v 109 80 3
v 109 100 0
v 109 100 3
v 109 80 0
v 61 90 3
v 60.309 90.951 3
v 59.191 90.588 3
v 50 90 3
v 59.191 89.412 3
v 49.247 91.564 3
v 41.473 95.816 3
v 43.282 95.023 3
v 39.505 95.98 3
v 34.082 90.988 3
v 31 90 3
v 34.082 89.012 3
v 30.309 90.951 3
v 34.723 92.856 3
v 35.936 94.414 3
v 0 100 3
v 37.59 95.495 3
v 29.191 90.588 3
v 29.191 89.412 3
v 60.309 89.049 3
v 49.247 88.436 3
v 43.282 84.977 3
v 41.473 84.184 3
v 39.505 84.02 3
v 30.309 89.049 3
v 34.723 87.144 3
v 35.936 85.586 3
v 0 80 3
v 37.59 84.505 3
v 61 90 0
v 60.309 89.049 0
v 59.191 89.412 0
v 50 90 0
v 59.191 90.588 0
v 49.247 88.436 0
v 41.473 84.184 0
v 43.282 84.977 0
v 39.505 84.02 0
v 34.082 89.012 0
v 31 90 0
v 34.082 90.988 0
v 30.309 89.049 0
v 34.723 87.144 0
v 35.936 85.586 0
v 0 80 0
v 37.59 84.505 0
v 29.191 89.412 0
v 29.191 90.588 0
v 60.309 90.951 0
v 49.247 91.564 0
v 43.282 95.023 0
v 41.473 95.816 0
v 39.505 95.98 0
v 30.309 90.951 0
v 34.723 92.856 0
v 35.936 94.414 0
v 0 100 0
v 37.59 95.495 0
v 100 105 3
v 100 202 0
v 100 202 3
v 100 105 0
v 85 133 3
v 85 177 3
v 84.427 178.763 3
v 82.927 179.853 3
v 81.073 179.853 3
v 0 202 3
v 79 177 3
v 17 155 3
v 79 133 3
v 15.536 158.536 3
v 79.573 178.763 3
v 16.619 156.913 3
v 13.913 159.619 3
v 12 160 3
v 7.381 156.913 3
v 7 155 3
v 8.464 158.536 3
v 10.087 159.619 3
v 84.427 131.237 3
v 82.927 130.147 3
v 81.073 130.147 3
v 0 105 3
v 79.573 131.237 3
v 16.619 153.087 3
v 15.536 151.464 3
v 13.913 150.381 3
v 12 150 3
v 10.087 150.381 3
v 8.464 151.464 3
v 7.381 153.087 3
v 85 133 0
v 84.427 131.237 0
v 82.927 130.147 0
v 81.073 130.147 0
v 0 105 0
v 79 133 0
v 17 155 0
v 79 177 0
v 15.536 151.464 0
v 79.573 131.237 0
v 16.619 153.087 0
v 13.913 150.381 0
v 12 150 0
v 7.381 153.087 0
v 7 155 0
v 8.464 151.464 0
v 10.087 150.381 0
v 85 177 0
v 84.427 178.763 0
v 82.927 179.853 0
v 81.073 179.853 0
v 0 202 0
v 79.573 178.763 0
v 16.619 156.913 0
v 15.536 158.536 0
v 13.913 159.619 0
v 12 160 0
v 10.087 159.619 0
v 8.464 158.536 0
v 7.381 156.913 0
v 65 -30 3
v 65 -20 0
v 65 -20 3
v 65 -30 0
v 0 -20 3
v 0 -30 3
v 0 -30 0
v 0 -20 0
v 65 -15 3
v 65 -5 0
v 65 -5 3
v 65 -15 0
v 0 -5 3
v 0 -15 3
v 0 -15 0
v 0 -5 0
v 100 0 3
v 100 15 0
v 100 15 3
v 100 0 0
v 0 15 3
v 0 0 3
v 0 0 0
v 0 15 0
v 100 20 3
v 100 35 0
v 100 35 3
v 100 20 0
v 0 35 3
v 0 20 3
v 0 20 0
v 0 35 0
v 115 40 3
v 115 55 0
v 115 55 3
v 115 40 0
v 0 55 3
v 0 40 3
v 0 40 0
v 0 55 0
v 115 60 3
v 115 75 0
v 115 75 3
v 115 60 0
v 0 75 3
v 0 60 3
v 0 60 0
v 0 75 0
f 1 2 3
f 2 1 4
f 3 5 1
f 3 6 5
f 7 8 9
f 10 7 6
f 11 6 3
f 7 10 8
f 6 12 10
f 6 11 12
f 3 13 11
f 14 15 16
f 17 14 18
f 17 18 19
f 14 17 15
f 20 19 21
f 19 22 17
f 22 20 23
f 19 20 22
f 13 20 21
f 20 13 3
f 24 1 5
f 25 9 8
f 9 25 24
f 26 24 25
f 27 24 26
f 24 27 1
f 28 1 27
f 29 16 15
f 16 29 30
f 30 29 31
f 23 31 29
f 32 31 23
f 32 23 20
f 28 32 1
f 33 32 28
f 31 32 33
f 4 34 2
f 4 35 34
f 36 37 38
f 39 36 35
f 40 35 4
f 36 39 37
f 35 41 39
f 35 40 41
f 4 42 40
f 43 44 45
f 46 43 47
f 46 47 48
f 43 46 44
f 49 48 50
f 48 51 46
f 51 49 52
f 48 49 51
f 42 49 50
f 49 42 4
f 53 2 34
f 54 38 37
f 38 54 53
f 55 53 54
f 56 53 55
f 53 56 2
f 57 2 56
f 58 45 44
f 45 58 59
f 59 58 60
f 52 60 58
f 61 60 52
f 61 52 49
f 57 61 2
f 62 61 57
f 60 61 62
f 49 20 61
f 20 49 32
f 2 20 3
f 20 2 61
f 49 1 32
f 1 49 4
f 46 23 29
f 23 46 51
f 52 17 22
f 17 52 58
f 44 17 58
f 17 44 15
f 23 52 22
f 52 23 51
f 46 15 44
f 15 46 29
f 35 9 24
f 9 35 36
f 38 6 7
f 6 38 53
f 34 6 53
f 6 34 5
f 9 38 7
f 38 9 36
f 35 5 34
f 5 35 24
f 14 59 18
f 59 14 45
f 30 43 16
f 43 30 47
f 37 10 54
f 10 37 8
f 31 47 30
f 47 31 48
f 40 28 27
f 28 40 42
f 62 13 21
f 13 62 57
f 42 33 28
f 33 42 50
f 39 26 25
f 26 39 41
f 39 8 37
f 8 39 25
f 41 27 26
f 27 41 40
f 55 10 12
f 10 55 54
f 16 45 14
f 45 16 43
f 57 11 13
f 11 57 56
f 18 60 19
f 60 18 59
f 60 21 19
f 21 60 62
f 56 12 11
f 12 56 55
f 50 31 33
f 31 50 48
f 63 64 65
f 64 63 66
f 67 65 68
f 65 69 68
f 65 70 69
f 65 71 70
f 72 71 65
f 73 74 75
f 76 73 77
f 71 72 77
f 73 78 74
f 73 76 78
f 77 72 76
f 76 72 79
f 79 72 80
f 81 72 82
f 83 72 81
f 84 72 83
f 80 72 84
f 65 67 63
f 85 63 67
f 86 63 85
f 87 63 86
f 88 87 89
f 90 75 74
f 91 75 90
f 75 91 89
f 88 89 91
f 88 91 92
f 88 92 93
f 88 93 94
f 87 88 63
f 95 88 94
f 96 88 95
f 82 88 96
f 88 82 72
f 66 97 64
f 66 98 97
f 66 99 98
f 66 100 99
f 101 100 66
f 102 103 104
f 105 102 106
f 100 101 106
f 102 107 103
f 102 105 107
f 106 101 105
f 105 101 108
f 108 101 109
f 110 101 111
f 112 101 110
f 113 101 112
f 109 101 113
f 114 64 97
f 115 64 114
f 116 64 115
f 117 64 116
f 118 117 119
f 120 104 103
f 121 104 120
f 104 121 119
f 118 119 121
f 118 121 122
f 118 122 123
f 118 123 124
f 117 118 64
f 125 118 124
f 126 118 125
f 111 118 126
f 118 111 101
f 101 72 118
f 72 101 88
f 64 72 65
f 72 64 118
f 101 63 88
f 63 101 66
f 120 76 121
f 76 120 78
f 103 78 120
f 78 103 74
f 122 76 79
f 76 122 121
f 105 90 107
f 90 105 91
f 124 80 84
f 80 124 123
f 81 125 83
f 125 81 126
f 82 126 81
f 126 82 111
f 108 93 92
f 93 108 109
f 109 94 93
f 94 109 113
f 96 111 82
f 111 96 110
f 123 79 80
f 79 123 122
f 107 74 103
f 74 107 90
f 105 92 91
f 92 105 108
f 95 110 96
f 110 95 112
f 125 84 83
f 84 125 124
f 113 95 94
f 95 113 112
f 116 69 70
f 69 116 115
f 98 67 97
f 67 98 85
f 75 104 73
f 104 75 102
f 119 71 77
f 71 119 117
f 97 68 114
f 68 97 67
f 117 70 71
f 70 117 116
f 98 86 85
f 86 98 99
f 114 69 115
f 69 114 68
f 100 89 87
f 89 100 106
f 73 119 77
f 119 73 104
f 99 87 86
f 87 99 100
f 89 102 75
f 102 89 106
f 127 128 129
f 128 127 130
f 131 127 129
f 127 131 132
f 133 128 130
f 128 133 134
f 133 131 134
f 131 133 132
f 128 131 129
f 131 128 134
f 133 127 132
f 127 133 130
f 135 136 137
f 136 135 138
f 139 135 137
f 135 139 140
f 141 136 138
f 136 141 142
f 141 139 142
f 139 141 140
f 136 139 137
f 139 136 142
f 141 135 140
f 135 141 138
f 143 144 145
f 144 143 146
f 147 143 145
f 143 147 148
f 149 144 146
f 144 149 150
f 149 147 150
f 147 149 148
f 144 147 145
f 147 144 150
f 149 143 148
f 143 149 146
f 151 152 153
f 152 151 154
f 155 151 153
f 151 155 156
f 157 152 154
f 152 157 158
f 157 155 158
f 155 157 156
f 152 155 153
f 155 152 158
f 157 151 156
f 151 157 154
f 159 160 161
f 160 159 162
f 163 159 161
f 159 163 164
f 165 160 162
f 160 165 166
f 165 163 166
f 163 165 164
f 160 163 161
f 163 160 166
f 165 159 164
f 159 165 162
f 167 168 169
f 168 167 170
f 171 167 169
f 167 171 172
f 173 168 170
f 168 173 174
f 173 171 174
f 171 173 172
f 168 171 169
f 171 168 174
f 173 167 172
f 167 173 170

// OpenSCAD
//Wood parts

//Servo model
//http://www.thingiverse.com/thing:697243

translate([0,-30,0])
	cube([65,10,3]);

translate([0,-15,0])
	cube([65,10,3]);

cube([100,15,3]);

translate([0,20,0])
	cube([100,15,3]);
	
translate([0,40,0])
	cube([115,15,3]);	
	
translate([0,60,0])
	cube([115,15,3]);
	
//Servo plank
translate([0,80,0])
	difference(){
	cube([109,20,3]);
	translate([30,10,-2])		
		cylinder(d=2,h=8,centre=true);
	translate([60,10,-2])		
		cylinder(d=2,h=8,centre=true);
	translate([40,10,-2])
		hull() {
			cylinder(d=12,h=8,centre=true);
			translate([8,0,0])	
			cylinder(d=4,h=8,centre=true);
			}
	}
	
//Back board
	
translate([0,105,0])
	difference(){
	cube([100,97,3]);
	translate([12,50,-2])		
		cylinder(d=10,h=8,centre=true);
	translate([82,28,-2])
		hull() {
			cylinder(d=6,h=8,centre=true);
			translate([0,44,0])	
			cylinder(d=6,h=8,centre=true);
	}
		}
